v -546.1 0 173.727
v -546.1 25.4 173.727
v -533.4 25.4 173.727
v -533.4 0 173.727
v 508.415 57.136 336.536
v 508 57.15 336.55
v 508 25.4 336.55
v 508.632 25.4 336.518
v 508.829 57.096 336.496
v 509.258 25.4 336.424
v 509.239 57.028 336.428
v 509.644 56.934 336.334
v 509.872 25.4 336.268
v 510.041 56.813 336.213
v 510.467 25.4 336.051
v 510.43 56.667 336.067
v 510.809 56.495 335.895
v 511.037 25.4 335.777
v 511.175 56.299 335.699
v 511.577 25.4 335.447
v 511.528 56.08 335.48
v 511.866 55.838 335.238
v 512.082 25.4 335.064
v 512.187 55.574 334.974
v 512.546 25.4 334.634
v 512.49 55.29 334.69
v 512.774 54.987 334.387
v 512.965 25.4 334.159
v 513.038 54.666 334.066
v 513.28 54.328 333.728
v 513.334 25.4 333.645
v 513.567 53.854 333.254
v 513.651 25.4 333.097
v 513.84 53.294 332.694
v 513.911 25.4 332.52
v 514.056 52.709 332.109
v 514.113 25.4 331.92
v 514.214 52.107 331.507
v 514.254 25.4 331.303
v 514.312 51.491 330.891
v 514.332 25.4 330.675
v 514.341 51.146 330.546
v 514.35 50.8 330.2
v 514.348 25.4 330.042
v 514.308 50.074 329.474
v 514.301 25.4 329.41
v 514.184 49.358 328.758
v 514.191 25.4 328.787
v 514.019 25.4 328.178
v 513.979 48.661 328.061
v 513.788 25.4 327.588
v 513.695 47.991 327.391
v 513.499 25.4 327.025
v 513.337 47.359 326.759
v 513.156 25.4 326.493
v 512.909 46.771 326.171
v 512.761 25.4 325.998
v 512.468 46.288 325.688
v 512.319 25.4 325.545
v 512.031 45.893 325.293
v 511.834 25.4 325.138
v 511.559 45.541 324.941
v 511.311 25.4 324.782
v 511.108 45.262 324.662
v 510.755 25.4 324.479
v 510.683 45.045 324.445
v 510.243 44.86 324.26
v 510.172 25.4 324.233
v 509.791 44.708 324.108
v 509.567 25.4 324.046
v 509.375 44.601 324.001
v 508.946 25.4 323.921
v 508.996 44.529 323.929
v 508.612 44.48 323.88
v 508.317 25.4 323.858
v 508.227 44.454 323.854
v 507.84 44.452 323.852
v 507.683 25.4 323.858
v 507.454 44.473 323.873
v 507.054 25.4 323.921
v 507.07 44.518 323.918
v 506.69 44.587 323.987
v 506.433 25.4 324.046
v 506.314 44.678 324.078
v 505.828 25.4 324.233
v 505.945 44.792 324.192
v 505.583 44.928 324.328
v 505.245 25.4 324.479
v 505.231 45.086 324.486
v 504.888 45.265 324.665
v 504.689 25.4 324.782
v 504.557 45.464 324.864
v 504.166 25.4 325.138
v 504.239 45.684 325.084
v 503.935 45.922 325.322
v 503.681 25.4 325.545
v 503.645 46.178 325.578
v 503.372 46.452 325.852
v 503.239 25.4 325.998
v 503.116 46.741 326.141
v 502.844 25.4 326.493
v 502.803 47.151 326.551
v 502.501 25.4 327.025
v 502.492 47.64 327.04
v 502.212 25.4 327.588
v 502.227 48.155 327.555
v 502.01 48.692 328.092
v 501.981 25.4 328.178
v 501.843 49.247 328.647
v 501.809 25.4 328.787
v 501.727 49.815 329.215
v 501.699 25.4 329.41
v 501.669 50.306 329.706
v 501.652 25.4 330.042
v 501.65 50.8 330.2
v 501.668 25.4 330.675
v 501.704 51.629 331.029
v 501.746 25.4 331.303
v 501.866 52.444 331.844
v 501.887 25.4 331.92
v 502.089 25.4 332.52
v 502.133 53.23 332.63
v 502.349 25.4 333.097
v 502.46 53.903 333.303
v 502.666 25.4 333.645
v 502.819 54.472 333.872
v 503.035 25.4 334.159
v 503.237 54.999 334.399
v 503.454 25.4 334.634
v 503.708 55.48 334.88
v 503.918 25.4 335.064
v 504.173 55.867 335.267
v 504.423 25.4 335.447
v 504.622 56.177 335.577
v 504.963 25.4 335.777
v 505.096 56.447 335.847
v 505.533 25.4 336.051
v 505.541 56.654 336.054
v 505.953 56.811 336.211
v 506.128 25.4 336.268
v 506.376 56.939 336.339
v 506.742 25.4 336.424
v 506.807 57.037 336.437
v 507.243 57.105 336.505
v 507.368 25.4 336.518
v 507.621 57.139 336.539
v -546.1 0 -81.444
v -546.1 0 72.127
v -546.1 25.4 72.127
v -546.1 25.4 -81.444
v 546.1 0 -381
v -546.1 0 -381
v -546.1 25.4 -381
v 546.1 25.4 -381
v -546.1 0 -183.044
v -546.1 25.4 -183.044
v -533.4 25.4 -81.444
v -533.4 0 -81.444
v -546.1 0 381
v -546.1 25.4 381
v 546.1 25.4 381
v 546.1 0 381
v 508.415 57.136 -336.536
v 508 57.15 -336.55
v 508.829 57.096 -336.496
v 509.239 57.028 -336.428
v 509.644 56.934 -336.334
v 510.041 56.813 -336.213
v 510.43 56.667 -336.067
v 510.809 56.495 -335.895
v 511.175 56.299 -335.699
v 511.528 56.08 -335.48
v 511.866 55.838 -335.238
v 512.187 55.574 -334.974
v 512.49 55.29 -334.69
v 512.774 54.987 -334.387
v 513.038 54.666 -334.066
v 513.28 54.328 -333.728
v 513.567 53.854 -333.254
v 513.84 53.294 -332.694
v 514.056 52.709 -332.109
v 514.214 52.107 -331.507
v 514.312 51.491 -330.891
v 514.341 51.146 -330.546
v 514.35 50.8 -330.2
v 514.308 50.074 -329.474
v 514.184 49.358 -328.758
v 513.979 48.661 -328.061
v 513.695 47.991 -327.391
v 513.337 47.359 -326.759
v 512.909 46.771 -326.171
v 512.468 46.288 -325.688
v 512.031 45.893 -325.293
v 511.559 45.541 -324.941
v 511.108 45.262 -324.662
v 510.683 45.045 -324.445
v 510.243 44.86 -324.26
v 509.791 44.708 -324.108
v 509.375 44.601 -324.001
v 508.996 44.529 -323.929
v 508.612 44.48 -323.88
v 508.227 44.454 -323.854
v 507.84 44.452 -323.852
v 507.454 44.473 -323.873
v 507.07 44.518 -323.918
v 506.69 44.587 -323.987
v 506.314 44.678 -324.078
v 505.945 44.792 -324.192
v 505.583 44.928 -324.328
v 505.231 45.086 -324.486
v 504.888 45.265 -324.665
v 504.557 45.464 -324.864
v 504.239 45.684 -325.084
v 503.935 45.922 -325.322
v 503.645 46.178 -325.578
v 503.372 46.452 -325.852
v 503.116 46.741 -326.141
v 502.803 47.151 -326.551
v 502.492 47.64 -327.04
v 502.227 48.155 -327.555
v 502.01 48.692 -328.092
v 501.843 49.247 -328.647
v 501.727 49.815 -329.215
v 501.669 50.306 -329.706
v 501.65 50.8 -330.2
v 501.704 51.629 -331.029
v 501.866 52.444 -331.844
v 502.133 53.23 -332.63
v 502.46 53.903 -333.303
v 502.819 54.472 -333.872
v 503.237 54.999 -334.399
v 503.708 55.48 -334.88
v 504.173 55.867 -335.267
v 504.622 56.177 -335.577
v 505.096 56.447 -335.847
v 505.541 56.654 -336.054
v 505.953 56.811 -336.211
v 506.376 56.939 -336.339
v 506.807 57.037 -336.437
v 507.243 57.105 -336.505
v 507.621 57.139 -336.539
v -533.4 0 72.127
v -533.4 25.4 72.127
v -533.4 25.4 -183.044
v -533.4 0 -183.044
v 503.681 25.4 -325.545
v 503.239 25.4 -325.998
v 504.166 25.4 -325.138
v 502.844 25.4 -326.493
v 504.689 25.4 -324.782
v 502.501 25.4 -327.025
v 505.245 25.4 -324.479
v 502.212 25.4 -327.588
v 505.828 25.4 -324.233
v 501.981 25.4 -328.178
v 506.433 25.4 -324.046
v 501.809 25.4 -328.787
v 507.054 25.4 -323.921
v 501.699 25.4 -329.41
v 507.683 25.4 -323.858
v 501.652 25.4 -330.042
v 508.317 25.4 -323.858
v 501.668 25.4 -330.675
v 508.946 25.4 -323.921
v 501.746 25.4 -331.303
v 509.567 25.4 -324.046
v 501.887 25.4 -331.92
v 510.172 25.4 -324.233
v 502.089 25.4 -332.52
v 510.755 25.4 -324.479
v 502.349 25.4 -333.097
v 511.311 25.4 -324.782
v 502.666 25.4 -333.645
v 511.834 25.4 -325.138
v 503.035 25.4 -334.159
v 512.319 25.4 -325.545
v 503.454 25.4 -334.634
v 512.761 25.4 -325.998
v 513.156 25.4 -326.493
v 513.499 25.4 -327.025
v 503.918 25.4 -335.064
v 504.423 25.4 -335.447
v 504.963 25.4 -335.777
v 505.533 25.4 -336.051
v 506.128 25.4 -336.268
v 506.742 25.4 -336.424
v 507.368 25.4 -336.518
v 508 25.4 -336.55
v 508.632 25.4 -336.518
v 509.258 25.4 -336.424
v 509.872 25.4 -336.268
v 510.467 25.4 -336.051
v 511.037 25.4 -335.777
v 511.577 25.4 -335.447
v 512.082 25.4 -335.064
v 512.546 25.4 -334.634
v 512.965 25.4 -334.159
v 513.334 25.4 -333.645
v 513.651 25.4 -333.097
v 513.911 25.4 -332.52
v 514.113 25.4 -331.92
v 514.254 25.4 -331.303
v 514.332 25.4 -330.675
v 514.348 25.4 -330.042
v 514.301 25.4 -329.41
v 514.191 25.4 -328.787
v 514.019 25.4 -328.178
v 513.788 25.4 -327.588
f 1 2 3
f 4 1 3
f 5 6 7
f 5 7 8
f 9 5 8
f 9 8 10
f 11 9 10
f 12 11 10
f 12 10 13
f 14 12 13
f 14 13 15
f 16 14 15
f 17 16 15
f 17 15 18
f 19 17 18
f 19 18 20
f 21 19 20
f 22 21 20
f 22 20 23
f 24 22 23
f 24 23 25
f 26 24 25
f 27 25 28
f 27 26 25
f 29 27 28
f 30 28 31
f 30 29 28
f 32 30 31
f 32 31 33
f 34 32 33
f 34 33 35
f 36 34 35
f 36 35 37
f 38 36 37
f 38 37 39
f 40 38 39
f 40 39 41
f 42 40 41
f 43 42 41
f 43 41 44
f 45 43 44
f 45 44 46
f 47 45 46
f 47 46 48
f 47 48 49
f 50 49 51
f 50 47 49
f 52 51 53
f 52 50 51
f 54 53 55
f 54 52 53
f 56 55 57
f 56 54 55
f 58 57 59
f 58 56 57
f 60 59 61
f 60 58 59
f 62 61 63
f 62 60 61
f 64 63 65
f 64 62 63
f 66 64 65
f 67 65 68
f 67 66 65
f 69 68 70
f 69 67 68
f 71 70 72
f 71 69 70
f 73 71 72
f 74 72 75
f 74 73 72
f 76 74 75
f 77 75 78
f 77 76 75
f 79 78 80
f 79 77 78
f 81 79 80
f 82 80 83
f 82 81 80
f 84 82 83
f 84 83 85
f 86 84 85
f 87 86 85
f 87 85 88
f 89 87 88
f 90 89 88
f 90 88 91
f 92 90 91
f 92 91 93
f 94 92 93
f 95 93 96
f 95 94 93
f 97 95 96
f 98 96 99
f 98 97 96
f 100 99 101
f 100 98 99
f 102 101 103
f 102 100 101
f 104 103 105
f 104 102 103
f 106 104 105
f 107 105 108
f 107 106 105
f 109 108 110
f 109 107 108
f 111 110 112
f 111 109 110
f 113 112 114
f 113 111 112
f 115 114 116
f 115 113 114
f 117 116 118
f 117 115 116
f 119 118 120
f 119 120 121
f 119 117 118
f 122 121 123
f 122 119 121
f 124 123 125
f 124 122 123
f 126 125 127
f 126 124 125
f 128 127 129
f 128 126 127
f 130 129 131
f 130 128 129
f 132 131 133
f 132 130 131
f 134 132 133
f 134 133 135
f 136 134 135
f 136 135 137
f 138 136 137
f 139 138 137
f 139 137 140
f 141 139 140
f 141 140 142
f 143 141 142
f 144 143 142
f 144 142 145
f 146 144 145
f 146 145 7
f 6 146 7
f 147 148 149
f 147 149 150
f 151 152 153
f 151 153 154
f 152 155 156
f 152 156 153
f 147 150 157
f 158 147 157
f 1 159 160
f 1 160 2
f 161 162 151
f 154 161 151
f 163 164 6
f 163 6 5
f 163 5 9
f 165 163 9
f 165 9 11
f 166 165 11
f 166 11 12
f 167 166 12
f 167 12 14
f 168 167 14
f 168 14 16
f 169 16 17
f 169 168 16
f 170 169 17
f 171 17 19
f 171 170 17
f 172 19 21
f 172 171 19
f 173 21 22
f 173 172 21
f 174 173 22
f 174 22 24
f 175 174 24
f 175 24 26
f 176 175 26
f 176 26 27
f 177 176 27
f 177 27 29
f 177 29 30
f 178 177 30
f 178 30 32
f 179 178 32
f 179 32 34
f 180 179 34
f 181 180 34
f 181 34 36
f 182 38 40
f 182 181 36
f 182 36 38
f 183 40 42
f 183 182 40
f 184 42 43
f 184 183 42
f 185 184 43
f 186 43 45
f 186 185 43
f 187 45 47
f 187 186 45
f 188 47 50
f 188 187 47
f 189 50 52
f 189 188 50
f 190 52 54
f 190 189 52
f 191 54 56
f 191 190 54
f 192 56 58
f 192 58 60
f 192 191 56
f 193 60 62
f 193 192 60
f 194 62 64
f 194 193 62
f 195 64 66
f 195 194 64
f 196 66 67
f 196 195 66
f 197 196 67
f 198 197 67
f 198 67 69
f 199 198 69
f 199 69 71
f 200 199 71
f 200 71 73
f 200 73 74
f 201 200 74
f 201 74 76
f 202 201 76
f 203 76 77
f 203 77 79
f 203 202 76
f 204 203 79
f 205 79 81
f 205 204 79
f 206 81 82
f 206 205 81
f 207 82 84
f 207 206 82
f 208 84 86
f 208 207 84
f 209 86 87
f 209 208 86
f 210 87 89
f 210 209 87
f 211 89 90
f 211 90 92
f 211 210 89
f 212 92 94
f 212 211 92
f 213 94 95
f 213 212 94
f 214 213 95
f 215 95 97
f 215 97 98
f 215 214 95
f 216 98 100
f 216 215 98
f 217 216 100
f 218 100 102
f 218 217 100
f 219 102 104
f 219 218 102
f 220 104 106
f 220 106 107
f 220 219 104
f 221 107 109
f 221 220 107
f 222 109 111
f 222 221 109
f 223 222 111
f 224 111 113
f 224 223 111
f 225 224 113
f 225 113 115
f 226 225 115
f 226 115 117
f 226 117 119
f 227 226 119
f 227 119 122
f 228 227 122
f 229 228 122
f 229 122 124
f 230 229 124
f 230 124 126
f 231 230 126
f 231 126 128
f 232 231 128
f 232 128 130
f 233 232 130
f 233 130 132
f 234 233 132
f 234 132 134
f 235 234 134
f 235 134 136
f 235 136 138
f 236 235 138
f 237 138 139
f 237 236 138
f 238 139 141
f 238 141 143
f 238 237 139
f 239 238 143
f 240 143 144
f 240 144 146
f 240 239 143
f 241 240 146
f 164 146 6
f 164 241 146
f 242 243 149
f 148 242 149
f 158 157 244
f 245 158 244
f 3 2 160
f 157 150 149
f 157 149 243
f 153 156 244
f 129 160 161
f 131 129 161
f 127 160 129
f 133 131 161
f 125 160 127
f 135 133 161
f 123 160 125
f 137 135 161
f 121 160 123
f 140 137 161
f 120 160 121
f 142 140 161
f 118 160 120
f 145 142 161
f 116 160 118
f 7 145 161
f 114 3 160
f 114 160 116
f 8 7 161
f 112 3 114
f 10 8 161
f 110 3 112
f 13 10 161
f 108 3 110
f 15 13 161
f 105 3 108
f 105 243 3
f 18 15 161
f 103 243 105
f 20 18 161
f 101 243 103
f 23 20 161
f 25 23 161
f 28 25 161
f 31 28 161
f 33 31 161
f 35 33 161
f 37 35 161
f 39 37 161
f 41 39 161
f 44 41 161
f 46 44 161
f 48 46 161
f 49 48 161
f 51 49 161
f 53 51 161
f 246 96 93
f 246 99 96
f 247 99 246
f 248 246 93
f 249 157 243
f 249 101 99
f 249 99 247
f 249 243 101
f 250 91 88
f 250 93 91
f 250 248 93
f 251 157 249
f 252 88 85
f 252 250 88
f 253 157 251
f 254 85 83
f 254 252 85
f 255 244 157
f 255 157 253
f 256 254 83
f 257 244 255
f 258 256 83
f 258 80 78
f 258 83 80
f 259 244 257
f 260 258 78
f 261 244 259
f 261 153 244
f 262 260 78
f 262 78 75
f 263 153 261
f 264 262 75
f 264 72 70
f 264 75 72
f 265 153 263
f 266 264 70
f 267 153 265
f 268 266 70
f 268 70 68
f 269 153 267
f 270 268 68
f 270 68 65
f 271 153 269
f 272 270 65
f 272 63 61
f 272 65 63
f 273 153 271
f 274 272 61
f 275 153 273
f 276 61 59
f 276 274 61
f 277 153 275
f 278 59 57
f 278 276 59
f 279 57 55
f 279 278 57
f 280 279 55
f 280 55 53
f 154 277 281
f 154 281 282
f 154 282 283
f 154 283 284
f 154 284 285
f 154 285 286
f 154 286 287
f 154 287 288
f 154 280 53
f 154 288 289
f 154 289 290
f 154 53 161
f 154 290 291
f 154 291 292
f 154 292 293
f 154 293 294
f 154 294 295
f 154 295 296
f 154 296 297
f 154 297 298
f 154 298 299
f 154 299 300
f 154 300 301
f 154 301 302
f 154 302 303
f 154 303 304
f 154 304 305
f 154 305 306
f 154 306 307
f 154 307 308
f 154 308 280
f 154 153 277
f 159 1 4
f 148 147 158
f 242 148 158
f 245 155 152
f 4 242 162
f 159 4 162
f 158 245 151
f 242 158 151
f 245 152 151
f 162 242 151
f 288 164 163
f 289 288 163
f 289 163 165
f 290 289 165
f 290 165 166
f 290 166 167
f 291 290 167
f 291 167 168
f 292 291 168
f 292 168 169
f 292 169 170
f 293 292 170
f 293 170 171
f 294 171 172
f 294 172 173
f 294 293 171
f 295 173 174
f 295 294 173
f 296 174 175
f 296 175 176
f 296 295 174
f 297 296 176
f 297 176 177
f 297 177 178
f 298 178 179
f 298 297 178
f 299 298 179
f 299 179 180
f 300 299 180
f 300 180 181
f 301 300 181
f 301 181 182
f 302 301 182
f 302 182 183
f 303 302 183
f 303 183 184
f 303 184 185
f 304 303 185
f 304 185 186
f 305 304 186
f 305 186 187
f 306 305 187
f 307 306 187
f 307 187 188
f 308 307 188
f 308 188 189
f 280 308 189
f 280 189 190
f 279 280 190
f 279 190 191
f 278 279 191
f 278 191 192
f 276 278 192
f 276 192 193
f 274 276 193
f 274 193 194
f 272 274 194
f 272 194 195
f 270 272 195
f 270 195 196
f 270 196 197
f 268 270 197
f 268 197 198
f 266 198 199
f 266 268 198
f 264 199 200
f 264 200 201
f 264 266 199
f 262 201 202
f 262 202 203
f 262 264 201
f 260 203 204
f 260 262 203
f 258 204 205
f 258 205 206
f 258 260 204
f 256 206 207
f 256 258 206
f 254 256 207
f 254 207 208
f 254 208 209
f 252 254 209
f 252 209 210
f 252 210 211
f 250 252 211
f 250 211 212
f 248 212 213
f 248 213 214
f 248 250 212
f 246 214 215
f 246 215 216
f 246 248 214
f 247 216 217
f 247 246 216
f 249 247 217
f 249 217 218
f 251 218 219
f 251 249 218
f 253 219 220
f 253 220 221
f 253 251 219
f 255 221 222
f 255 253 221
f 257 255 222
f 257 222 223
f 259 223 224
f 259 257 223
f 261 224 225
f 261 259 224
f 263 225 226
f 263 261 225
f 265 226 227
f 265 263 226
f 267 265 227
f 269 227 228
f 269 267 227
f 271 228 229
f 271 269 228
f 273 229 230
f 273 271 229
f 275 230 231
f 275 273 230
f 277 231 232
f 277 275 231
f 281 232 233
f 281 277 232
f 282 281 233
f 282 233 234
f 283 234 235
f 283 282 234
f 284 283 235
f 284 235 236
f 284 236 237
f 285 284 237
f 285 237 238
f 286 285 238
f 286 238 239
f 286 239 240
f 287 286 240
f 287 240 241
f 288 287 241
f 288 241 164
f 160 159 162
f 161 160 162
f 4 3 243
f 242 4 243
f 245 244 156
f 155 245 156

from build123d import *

# Parameters (mm, degrees)
SKETCH1_W           = 1092.2
SKETCH1_H           = 762
BOSS_EXTRUDE1_DEPTH = 25.4
CUT_EXTRUDE1_DEPTH  = 667.356788815
SWEEP1_PROFILE_R    = 6.35


with BuildPart() as part:
    # Sketch1 → Boss-Extrude1 (new body)
    with BuildSketch(Plane(origin=(0, 0, 0), x_dir=(1, 0, 0), z_dir=(0, 1, 0))):
        Rectangle(SKETCH1_W, SKETCH1_H)
    extrude(amount=BOSS_EXTRUDE1_DEPTH)

    # Sketch2 → Cut-Extrude1 (cut, through all)
    with BuildSketch(Plane(origin=(0, 25.4, 0), x_dir=(1, 0, 0), z_dir=(0, 1, 0))):
        Polygon((-546.1, 183.043938976), (-546.1, 132.243938976), (-546.1, 81.443938976), (-533.4, 81.443938976), (-533.4, 183.043938976), align=None)
        Polygon((-546.1, -122.927339743), (-546.1, -173.727339743), (-533.4, -173.727339743), (-533.4, -72.127339743), (-546.1, -72.127339743), align=None)
    extrude(amount=-CUT_EXTRUDE1_DEPTH, mode=Mode.SUBTRACT)

    # Sweep1: sweep along a path in Sketch3
    with BuildLine(Plane(origin=(508, 0, 0), x_dir=(0, 0, -1), z_dir=(1, 0, 0))) as sweep1_path:
        Line((-330.2, 25.4), (-330.2, 50.8))
        Line((-330.2, 50.8), (330.2, 50.8))
        Line((330.2, 50.8), (330.2, 25.4))
    # Sweep1 profile (on start of the path) → Sweep1 (sweep)
    with BuildSketch(Plane(origin=(508, 25.4, 330.2), x_dir=(0, 0, 1), z_dir=(0, 1, 0))):
        Circle(SWEEP1_PROFILE_R)
    sweep(path=sweep1_path.line, transition=Transition.RIGHT)


solid = part.part
